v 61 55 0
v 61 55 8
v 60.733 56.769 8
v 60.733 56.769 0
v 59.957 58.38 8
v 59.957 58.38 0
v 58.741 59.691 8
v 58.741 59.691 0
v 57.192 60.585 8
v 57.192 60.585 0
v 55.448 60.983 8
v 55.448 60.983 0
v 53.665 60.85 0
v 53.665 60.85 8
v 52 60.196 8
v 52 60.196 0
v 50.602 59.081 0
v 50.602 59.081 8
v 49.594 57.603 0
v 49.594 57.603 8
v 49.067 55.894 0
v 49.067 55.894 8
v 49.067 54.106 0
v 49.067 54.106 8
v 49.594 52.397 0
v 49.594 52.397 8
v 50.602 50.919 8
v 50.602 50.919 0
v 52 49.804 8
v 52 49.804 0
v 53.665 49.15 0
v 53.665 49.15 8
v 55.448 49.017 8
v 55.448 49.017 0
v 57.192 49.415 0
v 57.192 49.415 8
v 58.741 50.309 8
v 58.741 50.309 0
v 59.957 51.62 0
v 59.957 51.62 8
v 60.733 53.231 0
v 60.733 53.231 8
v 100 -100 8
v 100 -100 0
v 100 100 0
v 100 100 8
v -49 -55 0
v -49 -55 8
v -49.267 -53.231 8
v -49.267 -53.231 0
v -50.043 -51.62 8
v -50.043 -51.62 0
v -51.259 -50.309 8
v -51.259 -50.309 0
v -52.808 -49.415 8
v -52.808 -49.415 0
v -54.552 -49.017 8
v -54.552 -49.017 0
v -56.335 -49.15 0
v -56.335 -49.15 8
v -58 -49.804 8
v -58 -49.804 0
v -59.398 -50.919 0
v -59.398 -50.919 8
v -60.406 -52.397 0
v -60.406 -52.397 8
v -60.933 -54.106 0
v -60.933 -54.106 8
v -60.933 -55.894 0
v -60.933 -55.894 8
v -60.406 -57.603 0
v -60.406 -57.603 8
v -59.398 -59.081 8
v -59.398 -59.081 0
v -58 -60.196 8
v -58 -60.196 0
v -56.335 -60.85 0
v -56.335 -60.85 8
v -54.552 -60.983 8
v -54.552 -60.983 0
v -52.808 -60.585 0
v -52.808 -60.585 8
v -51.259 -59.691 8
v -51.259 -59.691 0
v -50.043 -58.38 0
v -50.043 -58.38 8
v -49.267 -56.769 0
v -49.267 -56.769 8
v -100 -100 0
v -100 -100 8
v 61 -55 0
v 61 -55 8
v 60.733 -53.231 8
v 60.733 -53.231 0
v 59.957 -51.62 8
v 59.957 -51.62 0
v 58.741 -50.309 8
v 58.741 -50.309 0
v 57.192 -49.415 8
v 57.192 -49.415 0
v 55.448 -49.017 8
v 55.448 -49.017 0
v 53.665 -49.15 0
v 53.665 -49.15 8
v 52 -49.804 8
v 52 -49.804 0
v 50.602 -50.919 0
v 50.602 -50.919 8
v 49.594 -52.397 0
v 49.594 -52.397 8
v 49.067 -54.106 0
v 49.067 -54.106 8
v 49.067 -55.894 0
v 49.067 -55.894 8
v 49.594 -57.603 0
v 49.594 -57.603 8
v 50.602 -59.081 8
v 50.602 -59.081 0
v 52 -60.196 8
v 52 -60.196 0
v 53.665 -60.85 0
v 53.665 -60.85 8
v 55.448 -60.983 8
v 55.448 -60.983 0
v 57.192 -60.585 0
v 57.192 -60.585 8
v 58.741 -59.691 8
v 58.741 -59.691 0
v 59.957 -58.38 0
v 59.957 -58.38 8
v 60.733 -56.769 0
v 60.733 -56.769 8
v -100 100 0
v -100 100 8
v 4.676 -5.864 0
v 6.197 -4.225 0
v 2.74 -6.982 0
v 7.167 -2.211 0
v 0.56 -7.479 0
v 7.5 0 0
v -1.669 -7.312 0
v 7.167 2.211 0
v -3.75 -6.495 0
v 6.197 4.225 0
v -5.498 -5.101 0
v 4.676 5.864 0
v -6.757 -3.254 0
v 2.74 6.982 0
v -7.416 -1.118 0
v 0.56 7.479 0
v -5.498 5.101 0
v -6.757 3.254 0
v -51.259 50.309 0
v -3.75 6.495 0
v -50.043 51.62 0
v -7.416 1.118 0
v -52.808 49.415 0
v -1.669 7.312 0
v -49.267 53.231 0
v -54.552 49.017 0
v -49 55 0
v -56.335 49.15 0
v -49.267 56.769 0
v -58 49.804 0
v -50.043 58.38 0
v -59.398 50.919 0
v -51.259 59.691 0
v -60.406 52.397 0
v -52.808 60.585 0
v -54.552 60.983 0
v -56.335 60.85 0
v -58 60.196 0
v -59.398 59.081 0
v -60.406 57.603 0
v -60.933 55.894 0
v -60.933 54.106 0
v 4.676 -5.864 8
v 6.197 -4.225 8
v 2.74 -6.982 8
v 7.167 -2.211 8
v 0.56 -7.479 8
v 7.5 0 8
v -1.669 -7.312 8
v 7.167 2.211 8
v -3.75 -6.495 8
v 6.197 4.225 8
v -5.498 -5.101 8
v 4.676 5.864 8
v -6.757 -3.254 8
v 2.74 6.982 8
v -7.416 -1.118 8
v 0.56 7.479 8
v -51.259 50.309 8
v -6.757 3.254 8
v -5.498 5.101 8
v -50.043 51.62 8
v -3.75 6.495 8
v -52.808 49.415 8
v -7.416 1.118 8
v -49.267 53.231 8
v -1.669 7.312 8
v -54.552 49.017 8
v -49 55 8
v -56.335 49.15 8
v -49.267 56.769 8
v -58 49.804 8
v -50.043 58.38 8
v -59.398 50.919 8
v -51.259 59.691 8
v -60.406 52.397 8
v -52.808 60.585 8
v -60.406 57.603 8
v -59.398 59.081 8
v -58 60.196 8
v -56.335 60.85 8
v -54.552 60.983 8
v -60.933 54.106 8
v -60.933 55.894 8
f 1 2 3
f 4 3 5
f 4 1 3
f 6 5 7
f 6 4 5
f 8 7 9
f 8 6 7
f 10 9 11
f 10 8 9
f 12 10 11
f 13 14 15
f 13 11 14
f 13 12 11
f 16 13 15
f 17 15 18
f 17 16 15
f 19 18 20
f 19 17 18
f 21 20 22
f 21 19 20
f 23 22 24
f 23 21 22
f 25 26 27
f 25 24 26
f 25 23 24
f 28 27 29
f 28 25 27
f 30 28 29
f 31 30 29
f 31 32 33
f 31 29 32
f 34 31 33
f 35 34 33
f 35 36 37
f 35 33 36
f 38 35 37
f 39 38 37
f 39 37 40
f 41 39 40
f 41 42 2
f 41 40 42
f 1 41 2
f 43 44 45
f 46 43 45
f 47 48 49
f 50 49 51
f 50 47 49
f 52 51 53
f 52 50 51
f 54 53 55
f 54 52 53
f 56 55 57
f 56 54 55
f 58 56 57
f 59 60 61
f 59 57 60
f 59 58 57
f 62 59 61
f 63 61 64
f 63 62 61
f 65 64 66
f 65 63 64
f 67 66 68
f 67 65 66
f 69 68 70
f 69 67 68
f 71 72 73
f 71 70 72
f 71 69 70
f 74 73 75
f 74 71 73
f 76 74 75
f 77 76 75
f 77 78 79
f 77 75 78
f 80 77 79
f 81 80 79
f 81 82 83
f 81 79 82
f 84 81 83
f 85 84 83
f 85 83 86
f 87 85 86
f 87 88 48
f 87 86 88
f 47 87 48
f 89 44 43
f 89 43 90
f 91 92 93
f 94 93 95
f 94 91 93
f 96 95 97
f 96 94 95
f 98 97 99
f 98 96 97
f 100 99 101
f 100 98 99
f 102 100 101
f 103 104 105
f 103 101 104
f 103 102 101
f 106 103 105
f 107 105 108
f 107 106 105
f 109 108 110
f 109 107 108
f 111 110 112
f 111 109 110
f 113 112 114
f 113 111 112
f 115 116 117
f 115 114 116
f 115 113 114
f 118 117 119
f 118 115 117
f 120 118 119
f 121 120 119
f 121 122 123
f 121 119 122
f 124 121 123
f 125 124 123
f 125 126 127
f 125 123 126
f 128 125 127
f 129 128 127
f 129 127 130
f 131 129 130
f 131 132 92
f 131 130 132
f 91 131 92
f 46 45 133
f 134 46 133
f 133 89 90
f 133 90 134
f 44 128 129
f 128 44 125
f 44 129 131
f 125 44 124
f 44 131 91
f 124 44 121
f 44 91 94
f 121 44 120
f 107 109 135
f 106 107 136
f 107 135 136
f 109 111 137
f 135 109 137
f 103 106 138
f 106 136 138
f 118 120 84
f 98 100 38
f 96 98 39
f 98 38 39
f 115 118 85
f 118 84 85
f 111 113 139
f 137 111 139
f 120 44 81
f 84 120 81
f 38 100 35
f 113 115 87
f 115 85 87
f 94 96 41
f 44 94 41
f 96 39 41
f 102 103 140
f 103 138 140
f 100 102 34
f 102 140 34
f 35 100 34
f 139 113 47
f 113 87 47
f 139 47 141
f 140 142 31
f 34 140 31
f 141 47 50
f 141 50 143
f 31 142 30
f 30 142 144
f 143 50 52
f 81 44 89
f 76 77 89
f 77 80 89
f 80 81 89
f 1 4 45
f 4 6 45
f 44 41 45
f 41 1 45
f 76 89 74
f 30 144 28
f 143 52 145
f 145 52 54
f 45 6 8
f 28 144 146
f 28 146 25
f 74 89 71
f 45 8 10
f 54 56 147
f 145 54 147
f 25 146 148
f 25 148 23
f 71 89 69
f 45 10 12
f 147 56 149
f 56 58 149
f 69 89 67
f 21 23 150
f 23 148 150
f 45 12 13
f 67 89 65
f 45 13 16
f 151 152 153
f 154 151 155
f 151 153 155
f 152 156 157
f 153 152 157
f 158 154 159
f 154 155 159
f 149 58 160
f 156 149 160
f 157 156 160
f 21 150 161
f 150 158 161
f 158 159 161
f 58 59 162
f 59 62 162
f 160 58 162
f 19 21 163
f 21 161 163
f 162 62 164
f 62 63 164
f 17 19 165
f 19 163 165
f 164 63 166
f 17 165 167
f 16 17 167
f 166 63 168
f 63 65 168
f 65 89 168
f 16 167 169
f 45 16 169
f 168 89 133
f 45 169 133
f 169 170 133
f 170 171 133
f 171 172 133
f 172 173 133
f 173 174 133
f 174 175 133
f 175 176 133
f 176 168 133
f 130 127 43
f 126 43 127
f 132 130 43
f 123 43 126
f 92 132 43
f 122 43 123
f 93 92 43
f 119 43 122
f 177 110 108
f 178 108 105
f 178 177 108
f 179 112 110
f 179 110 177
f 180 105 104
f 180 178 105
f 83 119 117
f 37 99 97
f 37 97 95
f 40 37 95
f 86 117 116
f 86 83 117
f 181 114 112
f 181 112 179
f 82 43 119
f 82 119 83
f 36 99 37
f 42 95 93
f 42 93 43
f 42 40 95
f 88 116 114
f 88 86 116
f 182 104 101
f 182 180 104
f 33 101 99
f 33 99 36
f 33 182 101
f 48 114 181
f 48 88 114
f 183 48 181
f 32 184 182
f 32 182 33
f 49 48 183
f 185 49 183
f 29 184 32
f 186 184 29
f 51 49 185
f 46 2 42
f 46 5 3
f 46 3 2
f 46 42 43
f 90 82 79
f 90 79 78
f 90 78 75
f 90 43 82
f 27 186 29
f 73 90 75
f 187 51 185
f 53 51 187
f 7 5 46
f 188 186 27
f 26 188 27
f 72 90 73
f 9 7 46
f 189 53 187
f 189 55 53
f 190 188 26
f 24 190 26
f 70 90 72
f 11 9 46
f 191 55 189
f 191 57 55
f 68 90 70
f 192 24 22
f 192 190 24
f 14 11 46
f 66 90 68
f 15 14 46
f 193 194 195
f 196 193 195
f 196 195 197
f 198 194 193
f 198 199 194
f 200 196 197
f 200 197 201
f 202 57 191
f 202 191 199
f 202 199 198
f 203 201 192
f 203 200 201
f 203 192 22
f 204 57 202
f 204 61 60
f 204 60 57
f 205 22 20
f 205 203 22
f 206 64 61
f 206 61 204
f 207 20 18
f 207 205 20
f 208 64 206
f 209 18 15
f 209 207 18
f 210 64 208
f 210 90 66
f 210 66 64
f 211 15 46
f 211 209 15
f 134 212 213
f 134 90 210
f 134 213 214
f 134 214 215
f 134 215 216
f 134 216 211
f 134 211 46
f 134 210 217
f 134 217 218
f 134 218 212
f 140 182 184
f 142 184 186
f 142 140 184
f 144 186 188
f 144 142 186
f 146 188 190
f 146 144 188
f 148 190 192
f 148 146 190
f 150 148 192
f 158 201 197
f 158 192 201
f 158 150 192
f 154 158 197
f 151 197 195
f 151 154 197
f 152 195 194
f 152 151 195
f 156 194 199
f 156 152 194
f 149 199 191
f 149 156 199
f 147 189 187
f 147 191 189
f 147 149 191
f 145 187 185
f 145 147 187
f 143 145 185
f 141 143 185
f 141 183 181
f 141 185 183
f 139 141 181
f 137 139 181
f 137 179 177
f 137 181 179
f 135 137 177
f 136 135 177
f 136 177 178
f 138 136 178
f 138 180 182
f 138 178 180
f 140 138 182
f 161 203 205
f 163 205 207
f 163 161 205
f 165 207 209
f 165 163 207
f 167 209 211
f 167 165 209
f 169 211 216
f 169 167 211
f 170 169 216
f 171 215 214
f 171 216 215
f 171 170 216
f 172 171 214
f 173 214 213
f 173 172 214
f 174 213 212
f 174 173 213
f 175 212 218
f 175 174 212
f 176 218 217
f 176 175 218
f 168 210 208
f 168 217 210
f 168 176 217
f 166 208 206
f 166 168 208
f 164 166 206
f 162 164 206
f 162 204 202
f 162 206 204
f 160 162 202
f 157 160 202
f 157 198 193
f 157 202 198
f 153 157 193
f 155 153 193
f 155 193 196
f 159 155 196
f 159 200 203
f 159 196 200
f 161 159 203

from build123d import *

# Parameters (mm, degrees)
SKETCH1_W           = 200
SKETCH1_H           = 200
BOSS_EXTRUDE1_DEPTH = 8
SKETCH2_R           = 6
CUT_EXTRUDE1_DEPTH  = 142.647449677
SKETCH3_R           = 7.5
CUT_EXTRUDE2_DEPTH  = 142.647449677


with BuildPart() as part:
    # Sketch1 → Boss-Extrude1 (new body)
    with BuildSketch(Plane(origin=(0, 0, 0), x_dir=(0, 1, 0), z_dir=(0, 0, 1))):
        Rectangle(SKETCH1_W, SKETCH1_H)
    extrude(amount=BOSS_EXTRUDE1_DEPTH)

    # Sketch2 → Cut-Extrude1 (cut, through all)
    with BuildSketch(Plane(origin=(0, 0, 0), x_dir=(0, 1, 0), z_dir=(0, 0, 1))):
        with Locations(Location((-55, 55, 0), (0, 0, 270))):
            Circle(SKETCH2_R)
        with Locations(Location((55, 55, 0), (0, 0, 270))):
            Circle(SKETCH2_R)
        with Locations(Location((-55, -55, 0), (0, 0, 270))):
            Circle(SKETCH2_R)
        with Locations(Location((55, -55, 0), (0, 0, 270))):
            Circle(SKETCH2_R)
    extrude(amount=CUT_EXTRUDE1_DEPTH, mode=Mode.SUBTRACT)

    # Sketch3 → Cut-Extrude2 (cut, through all)
    with BuildSketch(Plane(origin=(0, 0, 0), x_dir=(0, 1, 0), z_dir=(0, 0, 1))):
        with Locations(Location((0, 0, 0), (0, 0, 270))):
            Circle(SKETCH3_R)
    extrude(amount=CUT_EXTRUDE2_DEPTH, mode=Mode.SUBTRACT)


solid = part.part
